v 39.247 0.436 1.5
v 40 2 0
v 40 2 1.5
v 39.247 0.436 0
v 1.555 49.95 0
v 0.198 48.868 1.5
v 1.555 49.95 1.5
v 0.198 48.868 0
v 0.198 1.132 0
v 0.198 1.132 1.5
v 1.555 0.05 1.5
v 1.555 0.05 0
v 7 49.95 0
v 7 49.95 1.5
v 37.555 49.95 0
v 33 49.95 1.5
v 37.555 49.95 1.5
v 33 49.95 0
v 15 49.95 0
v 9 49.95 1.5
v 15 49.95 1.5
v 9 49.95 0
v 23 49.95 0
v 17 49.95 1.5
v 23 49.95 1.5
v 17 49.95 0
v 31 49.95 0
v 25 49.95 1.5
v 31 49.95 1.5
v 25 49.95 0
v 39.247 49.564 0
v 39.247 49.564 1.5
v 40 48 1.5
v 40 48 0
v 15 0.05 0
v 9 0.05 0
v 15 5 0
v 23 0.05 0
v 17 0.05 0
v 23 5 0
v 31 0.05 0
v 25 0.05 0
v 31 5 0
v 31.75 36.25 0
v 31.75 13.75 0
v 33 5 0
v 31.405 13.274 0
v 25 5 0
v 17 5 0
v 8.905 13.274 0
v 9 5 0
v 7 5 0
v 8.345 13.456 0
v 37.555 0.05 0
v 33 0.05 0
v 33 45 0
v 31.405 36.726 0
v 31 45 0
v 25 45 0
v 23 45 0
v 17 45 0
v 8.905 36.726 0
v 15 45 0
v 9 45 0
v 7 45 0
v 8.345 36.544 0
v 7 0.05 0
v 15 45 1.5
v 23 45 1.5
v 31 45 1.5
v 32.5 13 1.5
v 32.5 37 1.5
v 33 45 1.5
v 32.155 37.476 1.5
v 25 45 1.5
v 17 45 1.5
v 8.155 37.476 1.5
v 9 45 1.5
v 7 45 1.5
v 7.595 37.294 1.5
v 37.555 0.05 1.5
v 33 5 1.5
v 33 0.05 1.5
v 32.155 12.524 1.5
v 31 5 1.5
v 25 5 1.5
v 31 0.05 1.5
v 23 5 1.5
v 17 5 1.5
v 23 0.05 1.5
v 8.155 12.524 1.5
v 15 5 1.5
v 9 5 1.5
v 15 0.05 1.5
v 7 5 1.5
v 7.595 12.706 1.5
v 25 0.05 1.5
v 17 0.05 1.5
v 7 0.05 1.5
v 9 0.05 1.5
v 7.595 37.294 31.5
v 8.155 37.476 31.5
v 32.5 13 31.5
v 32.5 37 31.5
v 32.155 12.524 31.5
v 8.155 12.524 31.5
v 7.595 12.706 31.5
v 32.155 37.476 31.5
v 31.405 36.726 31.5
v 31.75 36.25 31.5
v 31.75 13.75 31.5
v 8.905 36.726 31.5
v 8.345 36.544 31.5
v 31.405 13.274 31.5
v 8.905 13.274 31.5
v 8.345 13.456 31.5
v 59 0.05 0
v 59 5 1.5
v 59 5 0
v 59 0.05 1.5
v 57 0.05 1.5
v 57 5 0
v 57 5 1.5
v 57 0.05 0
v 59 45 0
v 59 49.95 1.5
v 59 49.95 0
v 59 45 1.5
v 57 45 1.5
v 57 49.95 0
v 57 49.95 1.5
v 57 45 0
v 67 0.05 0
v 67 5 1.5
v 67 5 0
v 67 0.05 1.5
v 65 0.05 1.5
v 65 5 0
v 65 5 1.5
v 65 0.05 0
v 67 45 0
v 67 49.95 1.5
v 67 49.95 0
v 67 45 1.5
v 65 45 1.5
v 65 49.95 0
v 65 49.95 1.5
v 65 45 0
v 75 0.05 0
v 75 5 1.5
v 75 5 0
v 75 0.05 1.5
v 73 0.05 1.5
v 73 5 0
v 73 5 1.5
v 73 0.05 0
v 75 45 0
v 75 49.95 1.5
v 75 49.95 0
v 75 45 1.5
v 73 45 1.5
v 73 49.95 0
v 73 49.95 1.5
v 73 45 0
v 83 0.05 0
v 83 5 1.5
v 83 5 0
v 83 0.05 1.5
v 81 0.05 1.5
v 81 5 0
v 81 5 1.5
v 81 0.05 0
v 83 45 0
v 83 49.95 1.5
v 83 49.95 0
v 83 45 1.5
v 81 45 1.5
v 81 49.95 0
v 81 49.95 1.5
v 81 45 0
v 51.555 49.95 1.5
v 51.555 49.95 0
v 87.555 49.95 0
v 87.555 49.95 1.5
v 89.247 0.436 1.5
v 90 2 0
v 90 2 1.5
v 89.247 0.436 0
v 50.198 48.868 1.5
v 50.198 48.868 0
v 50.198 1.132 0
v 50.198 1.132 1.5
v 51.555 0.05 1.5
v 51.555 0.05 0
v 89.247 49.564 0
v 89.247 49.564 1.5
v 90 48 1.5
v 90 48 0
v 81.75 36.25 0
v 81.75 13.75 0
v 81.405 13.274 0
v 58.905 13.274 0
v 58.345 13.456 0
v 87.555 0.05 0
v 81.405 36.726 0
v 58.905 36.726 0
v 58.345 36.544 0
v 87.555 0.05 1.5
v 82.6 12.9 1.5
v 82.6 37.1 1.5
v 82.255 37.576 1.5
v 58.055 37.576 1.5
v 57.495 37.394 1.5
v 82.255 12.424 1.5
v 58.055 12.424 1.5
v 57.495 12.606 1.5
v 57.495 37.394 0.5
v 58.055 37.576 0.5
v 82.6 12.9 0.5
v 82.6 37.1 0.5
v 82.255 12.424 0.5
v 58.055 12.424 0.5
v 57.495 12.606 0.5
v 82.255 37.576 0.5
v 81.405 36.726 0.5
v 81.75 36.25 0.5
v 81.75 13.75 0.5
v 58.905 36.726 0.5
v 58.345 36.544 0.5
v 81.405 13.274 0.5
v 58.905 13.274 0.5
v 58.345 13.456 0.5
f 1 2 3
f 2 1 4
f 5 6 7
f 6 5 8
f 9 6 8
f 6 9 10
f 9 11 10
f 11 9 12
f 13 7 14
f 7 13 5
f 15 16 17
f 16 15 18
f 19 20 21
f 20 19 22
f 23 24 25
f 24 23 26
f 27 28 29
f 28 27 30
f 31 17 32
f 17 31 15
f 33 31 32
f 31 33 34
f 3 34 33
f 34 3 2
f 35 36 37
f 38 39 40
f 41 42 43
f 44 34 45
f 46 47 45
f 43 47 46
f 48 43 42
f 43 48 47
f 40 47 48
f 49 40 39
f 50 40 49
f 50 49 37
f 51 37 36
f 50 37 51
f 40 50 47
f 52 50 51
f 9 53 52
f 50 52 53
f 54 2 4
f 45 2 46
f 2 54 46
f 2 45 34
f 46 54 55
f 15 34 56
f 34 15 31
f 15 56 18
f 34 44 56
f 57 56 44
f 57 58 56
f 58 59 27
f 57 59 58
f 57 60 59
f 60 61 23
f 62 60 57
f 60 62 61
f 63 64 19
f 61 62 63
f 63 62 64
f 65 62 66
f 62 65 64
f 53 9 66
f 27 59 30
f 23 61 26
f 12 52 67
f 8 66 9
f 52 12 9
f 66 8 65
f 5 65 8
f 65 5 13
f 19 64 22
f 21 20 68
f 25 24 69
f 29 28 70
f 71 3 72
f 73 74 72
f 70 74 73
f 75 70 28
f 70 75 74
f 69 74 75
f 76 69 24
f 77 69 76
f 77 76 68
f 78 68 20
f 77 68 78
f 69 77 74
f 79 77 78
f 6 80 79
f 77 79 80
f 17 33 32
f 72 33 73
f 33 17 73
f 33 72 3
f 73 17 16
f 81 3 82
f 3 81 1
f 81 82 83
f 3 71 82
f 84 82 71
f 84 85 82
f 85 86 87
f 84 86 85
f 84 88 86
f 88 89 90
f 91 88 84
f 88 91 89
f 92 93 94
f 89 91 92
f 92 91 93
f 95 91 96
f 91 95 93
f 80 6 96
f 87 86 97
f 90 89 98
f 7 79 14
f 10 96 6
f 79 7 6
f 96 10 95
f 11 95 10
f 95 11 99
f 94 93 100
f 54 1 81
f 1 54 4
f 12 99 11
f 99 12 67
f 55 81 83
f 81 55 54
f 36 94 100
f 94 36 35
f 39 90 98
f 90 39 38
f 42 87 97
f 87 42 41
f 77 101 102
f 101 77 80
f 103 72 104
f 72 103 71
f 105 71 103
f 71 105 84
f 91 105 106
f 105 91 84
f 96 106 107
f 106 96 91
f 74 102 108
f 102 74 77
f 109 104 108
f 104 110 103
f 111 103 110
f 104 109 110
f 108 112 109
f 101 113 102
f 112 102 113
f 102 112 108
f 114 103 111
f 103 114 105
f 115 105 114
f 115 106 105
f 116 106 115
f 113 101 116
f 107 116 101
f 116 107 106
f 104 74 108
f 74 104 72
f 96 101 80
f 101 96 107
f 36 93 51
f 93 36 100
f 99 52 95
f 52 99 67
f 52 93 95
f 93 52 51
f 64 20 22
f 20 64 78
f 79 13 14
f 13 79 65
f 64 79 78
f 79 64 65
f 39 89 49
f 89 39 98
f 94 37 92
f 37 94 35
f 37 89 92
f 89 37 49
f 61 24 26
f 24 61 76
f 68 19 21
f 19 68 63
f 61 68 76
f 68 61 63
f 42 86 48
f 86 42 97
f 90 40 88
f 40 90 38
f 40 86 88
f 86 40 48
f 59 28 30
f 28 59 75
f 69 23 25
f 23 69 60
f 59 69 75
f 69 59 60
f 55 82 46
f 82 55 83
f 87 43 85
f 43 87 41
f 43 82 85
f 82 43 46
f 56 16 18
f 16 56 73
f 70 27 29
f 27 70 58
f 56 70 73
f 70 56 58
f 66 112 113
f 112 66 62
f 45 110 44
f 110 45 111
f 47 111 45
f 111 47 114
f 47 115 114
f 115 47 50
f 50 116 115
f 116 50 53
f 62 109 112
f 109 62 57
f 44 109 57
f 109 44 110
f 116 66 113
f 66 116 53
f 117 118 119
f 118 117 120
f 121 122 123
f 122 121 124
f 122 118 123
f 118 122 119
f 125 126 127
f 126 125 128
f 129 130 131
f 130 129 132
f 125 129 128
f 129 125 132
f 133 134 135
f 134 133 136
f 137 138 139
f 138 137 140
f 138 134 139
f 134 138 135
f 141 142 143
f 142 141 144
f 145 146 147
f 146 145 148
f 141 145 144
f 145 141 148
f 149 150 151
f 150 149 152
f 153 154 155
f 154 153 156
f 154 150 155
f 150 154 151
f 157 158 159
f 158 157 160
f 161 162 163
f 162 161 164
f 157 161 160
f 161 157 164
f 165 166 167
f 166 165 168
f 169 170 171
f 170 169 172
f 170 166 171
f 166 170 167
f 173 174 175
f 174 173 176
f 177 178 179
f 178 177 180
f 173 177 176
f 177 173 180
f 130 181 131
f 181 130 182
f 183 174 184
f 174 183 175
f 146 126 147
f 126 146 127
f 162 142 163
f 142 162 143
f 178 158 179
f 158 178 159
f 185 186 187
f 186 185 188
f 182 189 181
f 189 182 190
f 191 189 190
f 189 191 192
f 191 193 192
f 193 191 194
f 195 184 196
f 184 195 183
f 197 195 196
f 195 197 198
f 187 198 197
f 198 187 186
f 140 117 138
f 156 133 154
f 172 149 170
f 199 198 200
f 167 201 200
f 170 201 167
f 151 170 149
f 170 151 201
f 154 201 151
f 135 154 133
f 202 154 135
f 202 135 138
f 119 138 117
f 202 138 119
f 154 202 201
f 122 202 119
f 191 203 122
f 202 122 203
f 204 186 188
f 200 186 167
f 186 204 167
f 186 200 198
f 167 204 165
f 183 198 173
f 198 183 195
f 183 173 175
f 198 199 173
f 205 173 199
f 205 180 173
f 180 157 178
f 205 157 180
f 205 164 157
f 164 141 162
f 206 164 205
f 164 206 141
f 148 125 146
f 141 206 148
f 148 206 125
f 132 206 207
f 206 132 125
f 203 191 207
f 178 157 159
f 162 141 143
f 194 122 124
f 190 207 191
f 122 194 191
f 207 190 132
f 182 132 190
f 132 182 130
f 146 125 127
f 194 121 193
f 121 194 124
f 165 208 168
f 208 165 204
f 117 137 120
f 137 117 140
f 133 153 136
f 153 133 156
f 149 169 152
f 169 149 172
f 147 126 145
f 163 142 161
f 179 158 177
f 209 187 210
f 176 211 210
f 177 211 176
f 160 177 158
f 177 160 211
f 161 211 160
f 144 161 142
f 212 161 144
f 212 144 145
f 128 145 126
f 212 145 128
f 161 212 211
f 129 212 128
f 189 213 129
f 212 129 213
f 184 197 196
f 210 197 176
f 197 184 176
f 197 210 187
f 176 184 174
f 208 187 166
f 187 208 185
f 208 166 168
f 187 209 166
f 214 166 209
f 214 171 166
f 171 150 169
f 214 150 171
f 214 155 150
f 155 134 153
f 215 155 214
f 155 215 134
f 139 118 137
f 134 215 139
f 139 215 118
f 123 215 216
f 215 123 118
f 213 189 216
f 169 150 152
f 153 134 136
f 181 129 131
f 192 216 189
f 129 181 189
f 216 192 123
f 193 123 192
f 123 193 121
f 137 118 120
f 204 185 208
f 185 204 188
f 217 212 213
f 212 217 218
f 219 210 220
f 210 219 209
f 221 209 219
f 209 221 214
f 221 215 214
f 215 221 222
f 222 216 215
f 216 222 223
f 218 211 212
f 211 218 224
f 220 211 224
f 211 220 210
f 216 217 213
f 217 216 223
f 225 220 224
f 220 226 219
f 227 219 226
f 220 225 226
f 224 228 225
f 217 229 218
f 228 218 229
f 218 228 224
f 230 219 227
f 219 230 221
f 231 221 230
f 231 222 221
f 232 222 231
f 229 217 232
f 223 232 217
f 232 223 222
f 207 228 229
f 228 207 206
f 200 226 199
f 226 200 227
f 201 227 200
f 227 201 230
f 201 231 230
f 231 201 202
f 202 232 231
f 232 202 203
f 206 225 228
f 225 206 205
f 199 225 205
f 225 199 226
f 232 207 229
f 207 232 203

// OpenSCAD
// Print plate for EI bobbin and cap
// Imports both parts and places them side by side for printing

/* [Spacing] */
spacing = 10;  // Gap between parts

/* [Flange] */
flange_x = 40;
flange_y = 50;
flange_z = 1.5;
flange_radius = 2;

/* [Core Area] */
core_inside_x = 23.5;
core_inside_y = 23.5;
core_wall = 0.75;
core_z = 30;
core_radius = 0.5;

/* [Recess] */
recess_x = 25;
recess_y = 25;
recess_depth = 1;
recess_clearance = 0.2;
recess_radius = 0.5;

/* [Hole] */
hole_x = 23.5;
hole_y = 23.5;
hole_radius = 0.5;

/* [Notches] */
notch_count = 4;
notch_width = 2;
notch_depth = 5;

module roundedcube(xdim, ydim, zdim, rdim){
    hull(){
        translate([rdim,rdim,0])cylinder(h=zdim,r=rdim);
        translate([xdim-rdim,rdim,0])cylinder(h=zdim,r=rdim);
        translate([rdim,ydim-rdim,0])cylinder(h=zdim,r=rdim);
        translate([xdim-rdim,ydim-rdim,0])cylinder(h=zdim,r=rdim);
    }
}

module mirror_copy(v) {
    children();
    mirror(v) children();
}

module notches() {
    step = flange_x / (notch_count + 1);
    for (x = [step : step : flange_x - step]) {
        translate([x - notch_width/2, -1, -0.01])
            cube([notch_width, notch_depth + 1, flange_z + 0.02]);
        translate([x - notch_width/2, flange_y - notch_depth, -0.01])
            cube([notch_width, notch_depth + 1, flange_z + 0.02]);
    }
}

module ei_bobbin() {
    core_x = core_inside_x + 2 * core_wall;
    core_y = core_inside_y + 2 * core_wall;
    core_offset_x = (flange_x - core_x) / 2;
    core_offset_y = (flange_y - core_y) / 2;
    hole_offset_x = (flange_x - core_inside_x) / 2;
    hole_offset_y = (flange_y - core_inside_y) / 2;

    difference(){
        union(){
            roundedcube(flange_x, flange_y, flange_z, flange_radius);
            translate([core_offset_x, core_offset_y, flange_z])
                roundedcube(core_x, core_y, core_z, core_radius);
        }
        translate([hole_offset_x, hole_offset_y, -1])
            roundedcube(core_inside_x, core_inside_y, flange_z + core_z + 2, core_radius);
        notches();
    }
}

module ei_bobbin_cap() {
    recess_actual_x = recess_x + recess_clearance;
    recess_actual_y = recess_y + recess_clearance;
    recess_offset_x = (flange_x - recess_actual_x) / 2;
    recess_offset_y = (flange_y - recess_actual_y) / 2;
    hole_offset_x = (flange_x - hole_x) / 2;
    hole_offset_y = (flange_y - hole_y) / 2;

    difference(){
        roundedcube(flange_x, flange_y, flange_z, flange_radius);
        translate([recess_offset_x, recess_offset_y, flange_z - recess_depth])
            roundedcube(recess_actual_x, recess_actual_y, recess_depth + 1, recess_radius);
        translate([hole_offset_x, hole_offset_y, -1])
            roundedcube(hole_x, hole_y, flange_z + 2, hole_radius);
        notches();
    }
}

// Place bobbin and cap side by side
ei_bobbin();
translate([flange_x + spacing, 0, 0])
    ei_bobbin_cap();
